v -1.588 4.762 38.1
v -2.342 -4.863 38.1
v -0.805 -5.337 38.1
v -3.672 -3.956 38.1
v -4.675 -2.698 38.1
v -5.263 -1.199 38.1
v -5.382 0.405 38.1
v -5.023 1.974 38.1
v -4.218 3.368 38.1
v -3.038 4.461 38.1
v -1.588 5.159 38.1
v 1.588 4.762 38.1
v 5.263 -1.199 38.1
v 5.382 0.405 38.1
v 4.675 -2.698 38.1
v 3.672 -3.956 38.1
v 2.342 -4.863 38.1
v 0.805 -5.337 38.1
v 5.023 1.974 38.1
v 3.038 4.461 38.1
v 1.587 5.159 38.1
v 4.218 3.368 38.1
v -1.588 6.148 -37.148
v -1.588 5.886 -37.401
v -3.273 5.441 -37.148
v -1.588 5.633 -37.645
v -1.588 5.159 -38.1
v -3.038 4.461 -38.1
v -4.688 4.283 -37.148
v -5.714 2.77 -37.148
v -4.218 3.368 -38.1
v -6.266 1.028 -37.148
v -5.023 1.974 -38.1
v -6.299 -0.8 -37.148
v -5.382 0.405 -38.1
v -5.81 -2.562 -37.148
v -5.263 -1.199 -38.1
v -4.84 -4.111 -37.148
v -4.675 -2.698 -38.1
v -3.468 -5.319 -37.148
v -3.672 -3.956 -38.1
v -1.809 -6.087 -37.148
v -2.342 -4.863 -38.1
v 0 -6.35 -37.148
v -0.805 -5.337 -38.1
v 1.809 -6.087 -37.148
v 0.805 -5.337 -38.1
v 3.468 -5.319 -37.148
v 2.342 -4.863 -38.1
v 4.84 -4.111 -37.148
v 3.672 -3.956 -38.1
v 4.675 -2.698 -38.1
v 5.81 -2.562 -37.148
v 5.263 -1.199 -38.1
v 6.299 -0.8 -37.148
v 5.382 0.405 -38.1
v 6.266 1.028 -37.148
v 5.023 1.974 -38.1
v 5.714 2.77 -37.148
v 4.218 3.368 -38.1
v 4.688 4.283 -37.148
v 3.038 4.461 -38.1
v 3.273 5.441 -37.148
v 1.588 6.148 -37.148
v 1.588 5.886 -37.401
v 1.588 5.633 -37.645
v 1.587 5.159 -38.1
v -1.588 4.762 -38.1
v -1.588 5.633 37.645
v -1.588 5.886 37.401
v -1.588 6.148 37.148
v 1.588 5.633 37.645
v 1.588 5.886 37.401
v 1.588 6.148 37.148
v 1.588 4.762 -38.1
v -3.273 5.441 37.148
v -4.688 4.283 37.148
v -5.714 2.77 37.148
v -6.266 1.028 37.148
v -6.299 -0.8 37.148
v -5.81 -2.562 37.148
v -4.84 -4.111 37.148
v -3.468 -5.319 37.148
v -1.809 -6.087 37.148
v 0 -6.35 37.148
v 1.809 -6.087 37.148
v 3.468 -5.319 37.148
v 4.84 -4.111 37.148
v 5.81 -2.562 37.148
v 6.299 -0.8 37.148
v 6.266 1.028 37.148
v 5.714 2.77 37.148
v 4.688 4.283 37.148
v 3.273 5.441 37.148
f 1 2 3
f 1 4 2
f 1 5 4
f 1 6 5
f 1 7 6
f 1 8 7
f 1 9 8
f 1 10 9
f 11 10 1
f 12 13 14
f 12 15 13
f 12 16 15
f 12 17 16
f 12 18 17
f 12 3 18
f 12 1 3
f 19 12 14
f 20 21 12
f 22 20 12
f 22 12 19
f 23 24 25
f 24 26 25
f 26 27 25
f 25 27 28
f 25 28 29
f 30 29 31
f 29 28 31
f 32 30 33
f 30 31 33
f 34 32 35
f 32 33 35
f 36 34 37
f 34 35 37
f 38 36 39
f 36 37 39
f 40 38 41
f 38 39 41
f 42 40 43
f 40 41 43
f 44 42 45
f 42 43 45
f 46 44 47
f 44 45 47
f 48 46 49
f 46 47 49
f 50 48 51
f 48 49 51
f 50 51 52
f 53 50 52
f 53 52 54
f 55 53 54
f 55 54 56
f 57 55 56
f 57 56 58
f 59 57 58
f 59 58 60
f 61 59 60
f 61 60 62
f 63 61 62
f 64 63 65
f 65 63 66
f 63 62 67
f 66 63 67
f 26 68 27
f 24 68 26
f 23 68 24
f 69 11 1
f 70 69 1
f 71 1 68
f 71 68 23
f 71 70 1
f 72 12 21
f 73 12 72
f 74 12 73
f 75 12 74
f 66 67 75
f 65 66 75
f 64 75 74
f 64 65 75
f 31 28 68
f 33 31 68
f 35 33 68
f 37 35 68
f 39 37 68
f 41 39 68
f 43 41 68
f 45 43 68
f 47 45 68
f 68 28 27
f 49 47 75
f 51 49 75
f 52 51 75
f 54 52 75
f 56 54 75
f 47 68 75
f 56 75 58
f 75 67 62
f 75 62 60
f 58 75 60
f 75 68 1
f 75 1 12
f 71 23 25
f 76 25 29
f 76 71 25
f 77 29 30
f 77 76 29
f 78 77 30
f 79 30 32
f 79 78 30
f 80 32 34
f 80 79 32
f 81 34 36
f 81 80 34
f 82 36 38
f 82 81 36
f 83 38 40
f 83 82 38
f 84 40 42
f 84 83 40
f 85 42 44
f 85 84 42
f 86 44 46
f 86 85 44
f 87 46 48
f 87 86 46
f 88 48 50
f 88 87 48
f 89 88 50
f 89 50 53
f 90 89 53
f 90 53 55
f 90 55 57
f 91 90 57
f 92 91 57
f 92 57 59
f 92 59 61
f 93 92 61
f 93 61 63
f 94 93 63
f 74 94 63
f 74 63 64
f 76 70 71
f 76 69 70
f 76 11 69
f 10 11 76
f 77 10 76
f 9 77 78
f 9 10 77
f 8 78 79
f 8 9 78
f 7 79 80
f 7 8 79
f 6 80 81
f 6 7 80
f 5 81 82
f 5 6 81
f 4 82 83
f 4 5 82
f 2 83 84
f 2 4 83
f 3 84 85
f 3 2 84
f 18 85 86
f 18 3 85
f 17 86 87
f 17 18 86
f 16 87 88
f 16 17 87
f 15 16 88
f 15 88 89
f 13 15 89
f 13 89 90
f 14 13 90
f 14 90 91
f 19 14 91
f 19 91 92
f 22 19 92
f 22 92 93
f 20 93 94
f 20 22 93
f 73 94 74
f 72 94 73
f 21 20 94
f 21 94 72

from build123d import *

# Parameters (mm, degrees)
SKETCH1_R           = 6.35
EXTRUDE1_DEPTH      = 38.1
CHAMFER1_SIZE       = 0.9525
SKETCH3_W           = 3.175
SKETCH3_H           = 1.5875
EXTRUDE2_DEPTH      = 39.1
EXTRUDE2_DEPTH_BACK = 39.1


with BuildPart() as part:
    # Sketch1 → Extrude1 (new body, symmetric)
    with BuildSketch(Plane.XY):
        Circle(SKETCH1_R)
    extrude(amount=EXTRUDE1_DEPTH, both=True)

    # Chamfer1
    chamfer1_edges = [part.edges().sort_by_distance(p)[0] for p in [
        (-6.35, 0, -38.1),
        (-6.35, 0, 38.1),
    ]]
    chamfer(chamfer1_edges, length=CHAMFER1_SIZE)

    # Sketch3 → Extrude2 (cut, two sides)
    with BuildSketch(Plane.XY) as extrude2_sk:
        with Locations((0, 5.55625)):
            Rectangle(SKETCH3_W, SKETCH3_H)
    extrude(amount=EXTRUDE2_DEPTH, mode=Mode.SUBTRACT)
    extrude(extrude2_sk.sketch, amount=-EXTRUDE2_DEPTH_BACK, mode=Mode.SUBTRACT)


solid = part.part
